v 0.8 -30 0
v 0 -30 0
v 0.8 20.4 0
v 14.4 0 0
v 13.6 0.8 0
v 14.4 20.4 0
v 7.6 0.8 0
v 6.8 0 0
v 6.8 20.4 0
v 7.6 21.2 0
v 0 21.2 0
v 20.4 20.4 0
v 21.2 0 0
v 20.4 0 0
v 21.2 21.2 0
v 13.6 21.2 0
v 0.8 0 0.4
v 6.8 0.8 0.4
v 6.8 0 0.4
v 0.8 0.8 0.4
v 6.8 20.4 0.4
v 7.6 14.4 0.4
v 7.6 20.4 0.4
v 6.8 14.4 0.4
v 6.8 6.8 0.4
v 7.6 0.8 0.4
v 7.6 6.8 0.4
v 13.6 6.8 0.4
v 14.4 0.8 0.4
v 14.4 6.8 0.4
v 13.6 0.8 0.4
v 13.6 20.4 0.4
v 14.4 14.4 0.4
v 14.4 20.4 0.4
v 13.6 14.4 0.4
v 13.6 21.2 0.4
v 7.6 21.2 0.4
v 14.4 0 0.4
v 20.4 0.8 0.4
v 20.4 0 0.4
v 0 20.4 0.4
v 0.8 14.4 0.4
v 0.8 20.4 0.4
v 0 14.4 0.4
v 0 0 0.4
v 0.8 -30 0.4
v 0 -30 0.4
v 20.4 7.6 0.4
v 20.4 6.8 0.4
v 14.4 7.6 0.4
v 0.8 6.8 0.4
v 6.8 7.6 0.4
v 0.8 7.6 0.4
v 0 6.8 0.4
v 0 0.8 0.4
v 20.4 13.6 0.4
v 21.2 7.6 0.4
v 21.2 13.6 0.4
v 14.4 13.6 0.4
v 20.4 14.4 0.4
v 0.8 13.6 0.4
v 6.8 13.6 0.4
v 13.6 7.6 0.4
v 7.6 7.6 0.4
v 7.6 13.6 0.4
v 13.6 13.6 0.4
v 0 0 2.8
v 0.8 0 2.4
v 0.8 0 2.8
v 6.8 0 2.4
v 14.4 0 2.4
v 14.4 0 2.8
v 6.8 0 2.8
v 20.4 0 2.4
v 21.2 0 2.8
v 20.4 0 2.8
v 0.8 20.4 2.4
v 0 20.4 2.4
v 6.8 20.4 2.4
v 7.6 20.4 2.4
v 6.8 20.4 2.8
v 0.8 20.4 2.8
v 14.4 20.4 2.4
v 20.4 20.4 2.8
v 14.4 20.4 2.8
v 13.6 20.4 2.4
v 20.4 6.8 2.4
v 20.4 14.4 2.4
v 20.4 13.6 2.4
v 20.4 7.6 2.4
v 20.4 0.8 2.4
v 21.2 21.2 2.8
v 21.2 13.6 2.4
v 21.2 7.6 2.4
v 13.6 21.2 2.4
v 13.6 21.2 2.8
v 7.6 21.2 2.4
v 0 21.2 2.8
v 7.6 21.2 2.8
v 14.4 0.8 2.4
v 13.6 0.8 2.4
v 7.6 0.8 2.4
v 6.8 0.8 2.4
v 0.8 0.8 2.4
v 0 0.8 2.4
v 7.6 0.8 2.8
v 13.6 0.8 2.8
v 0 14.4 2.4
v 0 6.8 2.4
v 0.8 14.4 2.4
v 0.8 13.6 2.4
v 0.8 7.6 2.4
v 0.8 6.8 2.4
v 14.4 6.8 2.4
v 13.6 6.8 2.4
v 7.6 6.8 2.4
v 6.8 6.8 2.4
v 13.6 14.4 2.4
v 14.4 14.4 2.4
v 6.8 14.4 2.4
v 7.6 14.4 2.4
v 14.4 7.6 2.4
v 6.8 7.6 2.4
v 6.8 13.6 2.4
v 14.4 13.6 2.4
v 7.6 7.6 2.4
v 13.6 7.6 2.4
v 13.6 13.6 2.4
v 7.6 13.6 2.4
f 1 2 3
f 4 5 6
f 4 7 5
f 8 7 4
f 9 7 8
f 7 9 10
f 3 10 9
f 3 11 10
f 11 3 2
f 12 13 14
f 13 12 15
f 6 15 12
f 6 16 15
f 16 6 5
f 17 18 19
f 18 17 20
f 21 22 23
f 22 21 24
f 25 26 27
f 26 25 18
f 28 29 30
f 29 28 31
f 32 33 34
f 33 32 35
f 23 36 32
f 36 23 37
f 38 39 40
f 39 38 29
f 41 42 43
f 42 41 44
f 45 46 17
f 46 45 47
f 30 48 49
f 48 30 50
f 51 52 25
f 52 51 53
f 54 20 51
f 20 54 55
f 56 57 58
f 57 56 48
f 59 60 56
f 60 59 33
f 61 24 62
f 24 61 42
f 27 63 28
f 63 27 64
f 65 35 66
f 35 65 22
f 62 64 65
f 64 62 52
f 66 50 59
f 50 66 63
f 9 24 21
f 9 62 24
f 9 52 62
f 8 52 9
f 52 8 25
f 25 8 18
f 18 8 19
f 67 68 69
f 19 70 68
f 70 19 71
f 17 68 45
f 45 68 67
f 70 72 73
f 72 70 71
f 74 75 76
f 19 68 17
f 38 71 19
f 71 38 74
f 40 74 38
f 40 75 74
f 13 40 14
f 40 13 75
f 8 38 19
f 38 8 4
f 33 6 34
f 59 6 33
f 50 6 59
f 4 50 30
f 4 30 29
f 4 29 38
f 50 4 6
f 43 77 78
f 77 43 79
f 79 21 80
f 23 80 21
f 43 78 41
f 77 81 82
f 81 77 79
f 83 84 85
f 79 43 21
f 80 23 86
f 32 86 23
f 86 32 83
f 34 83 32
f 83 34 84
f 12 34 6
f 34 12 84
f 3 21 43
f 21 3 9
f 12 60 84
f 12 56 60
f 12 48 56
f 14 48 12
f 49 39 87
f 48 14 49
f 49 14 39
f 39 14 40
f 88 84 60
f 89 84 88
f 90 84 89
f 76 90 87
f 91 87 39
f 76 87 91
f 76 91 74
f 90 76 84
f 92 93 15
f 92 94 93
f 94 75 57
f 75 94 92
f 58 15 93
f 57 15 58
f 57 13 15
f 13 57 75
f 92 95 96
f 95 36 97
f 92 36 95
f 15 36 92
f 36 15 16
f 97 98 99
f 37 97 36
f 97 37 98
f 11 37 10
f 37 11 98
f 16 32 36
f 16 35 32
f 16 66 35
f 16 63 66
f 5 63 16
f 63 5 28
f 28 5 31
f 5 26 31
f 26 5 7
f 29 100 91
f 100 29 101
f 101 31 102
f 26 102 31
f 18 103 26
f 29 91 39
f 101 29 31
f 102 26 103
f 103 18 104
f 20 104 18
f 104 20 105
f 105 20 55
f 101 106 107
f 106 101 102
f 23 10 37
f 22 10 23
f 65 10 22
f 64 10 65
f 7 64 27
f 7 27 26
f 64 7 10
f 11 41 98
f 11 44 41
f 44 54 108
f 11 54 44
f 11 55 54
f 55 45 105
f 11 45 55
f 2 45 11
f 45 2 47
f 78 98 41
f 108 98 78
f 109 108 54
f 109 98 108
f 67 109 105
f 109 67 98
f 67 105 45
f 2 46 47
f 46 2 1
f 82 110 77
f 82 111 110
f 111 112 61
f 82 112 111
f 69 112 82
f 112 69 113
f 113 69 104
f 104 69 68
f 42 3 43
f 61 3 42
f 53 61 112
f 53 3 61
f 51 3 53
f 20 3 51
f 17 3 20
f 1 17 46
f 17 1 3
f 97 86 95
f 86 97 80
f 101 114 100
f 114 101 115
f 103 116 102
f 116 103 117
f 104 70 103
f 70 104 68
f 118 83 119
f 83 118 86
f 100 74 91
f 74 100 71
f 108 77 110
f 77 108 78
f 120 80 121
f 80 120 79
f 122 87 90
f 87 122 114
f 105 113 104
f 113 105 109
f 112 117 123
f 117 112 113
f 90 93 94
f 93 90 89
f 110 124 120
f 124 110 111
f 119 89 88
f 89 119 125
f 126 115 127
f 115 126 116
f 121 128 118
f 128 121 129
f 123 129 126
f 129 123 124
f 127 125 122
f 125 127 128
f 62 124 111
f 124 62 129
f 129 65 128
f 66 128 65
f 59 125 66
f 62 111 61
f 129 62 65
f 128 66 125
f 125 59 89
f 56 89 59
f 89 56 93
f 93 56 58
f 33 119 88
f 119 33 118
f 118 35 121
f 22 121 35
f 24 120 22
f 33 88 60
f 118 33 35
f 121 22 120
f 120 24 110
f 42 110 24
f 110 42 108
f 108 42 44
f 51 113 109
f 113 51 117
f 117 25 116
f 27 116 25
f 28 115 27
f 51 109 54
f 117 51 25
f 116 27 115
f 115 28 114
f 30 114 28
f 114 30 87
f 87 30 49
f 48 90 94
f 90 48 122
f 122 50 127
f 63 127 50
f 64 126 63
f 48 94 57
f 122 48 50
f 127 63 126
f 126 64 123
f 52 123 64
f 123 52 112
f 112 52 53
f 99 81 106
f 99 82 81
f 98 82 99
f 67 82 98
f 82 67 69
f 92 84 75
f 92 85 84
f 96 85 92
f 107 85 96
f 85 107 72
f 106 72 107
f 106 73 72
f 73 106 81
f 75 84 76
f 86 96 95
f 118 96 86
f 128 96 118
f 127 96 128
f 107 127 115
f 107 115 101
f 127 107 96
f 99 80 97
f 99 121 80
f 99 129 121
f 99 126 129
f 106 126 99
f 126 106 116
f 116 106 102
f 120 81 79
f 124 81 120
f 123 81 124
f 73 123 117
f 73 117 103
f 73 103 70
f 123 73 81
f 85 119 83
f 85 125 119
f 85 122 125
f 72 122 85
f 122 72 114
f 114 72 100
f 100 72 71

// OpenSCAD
// file: ../../api/v3/reporting.scad
//////////////////////////////////////////////////////////////////////
// LibFile: reporting.scad
// Project: Grid Stack
// FileGroup: API v3 Reporting
// FileSummary: Console report for immutable direct and positive-gap coupons.
// Role: Records the exact environment, dimensions, support strategy, path
//       lengths, qualification status, and deposited-layer counts.
// Requires: API v3 indexes, mathematics, and path generator.
// Exports: report_structural_coupon_object().
//////////////////////////////////////////////////////////////////////

function _bridge_status3(span, process) =
    span <= process[PX3_BRIDGE_MAX]
        ? "within_owner_tested_limit"
        : "exploratory_beyond_owner_tested_limit";

module report_structural_coupon_object(object, report_level = "full") {
    material = object[SCO_MATERIAL];
    nozzle = object[SCO_NOZZLE];
    printer = object[SCO_PRINTER];
    process = object[SCO_PROCESS];
    boundary = object[SCO_BOUNDARY];
    gap = object[SCO_CLEAR_GAP];
    strategy = object[SCO_SUPPORT_STRATEGY];

    echo("--- Grid Stack immutable structural coupon ---");
    echo(str("Object: ", object[SCO_NAME], " revision ", object[SCO_REVISION]));
    echo(str("API/schema: ", object[SCO_REQUIRED_API], "/",
        object[SCO_SCHEMA_VERSION]));
    echo(str("Release/base commit: ", object[SCO_SOURCE_RELEASE], " / ",
        object[SCO_FRAMEWORK_BASE_COMMIT]));
    echo(str("Material/nozzle/printer: ", material[MAT3_FAMILY], " / ",
        nozzle[NZ3_DIAMETER], " mm / ", printer[PRN3_NAME]));
    echo(str("Cells: ", boundary[B3_CELLS_X], " x ", boundary[B3_CELLS_Y]));
    echo(str("Clear spans: ", boundary[B3_CLEAR_SPAN_X], " x ",
        boundary[B3_CLEAR_SPAN_Y], " mm"));
    echo(str("Span status: ",
        _bridge_status3(boundary[B3_CLEAR_SPAN_X], process)));
    echo(str("Outside size: ", boundary_size_x3(boundary, process, nozzle),
        " x ", boundary_size_y3(boundary, process, nozzle), " mm"));
    echo(str("Primitive trace: ", trace_width3(nozzle), " x ",
        trace_height3(process), " mm"));
    echo(str("Structural strand: ", strand_width3(process, nozzle), " x ",
        strand_height3(process), " mm"));
    echo(str("Clear vertical gap: ", gap, " mm"));
    echo(str("Support strategy: ", strategy));
    echo(str("Total modeled height: ", coupon_total_height3(object), " mm"));

    if (report_level == "full") {
        if (strategy == "direct_orthogonal") {
            lower = coupon_path(
                boundary, process, nozzle, 0, object[SCO_LEAD_IN]
            );
            upper = coupon_path(boundary, process, nozzle, 90, 0);
            echo(str("Lower/upper path lengths: ", path_length3(lower),
                " / ", path_length3(upper), " mm"));
            echo(str("Deposited layers: ", 2 * process[PX3_HEIGHT_PASSES]));
        }
        else {
            witness = coupon_path(
                boundary, process, nozzle, 90, object[SCO_LEAD_IN]
            );
            riser = coupon_path(boundary, process, nozzle, 0, 0);
            test = coupon_path(boundary, process, nozzle, 90, 0);
            echo(str("Witness/riser/test path lengths: ",
                path_length3(witness), " / ", path_length3(riser), " / ",
                path_length3(test), " mm"));
            echo(str("Riser deposited layers: ", round(gap_layer_count3(object))));
            echo(str("Total deposited layers: ",
                2 * process[PX3_HEIGHT_PASSES] +
                round(gap_layer_count3(object))));
        }
        echo(str("Status: ", object[SCO_STATUS]));
        echo(str("Notes: ", object[SCO_NOTES]));
    }
}
// file: ../../api/v3/validation.scad
//////////////////////////////////////////////////////////////////////
// LibFile: validation.scad
// Project: Grid Stack
// FileGroup: API v3 Validation
// FileSummary: Validates immutable environment records, count boundaries,
//              support strategy, path continuity, and layer quantization.
// Role: Rejects incompatible or physically floating recipes before geometry
//       is generated.
// Requires: API v3 indexes, mathematics, and path generator.
// Exports: validate_structural_coupon_object().
//////////////////////////////////////////////////////////////////////

module _validate_path3(points, boundary, orientation, lead_in) {
    run_count = orientation == 0
        ? boundary_strand_count_y3(boundary)
        : boundary_strand_count_x3(boundary);

    assert(len(points) == expected_coupon_point_count3(run_count, lead_in),
        "API v3 coupon path has an unexpected point count.");
    assert(!path_has_zero_segment3(points),
        "API v3 coupon path contains a zero-length segment.");
    assert(path_axis_aligned3(points),
        "API v3 coupon path must remain axis-aligned.");
    assert(points[0] != points[len(points) - 1],
        "API v3 coupon path must remain open.");
}

module validate_structural_coupon_object(object) {
    assert(object[SCO_REQUIRED_API] == GRID_STACK_API_VERSION,
        "Saved coupon requires a different Grid Stack API version.");
    assert(object[SCO_SCHEMA_VERSION] == GRID_STACK_COUPON_SCHEMA_VERSION,
        "Saved coupon requires a different coupon schema version.");
    assert(GRID_STACK_RECTANGULAR_FRAMEWORK_VERSION == 2,
        "Saved coupon requires rectangular framework version 2.");

    material = object[SCO_MATERIAL];
    nozzle = object[SCO_NOZZLE];
    printer = object[SCO_PRINTER];
    process = object[SCO_PROCESS];
    boundary = object[SCO_BOUNDARY];
    gap = object[SCO_CLEAR_GAP];
    lead_in = object[SCO_LEAD_IN];
    strategy = object[SCO_SUPPORT_STRATEGY];

    assert(nozzle[NZ3_DIAMETER] > 0,
        "Saved coupon nozzle diameter must be positive.");
    assert(process[PX3_LAYER_H] > 0,
        "Saved coupon layer height must be positive.");
    assert(process[PX3_WIDTH_PASSES] >= 2,
        "Saved coupon structural width requires at least two passes.");
    assert(process[PX3_HEIGHT_PASSES] >= 2,
        "Saved coupon structural height requires at least two layers.");
    assert(process[PX3_MATERIAL] == material[MAT3_NAME],
        "Saved coupon process/material references do not match.");
    assert(process[PX3_NOZZLE] == nozzle[NZ3_NAME],
        "Saved coupon process/nozzle references do not match.");
    assert(process[PX3_PRINTER] == printer[PRN3_NAME],
        "Saved coupon process/printer references do not match.");
    assert(boundary[B3_CELLS_X] > 0 && boundary[B3_CELLS_Y] > 0,
        "Saved coupon cell counts must be positive.");
    assert(boundary[B3_CLEAR_SPAN_X] > 0 &&
           boundary[B3_CLEAR_SPAN_Y] > 0,
        "Saved coupon clear spans must be positive.");
    assert(lead_in >= 0,
        "Saved coupon lead-in cannot be negative.");
    assert(gap >= 0,
        "Saved coupon clear gap cannot be negative.");
    assert(nearly_equal3(gap_layer_count3(object), round(gap_layer_count3(object))),
        "Saved coupon clear gap must equal a whole deposited-layer count.");
    assert(
        (strategy == "direct_orthogonal" && nearly_equal3(gap, 0)) ||
        (strategy == "witness_riser_bridge" && gap > 0),
        "Saved coupon support strategy does not match its clear gap."
    );

    if (strategy == "direct_orthogonal") {
        lower = coupon_path(boundary, process, nozzle, 0, lead_in);
        upper = coupon_path(boundary, process, nozzle, 90, 0);
        _validate_path3(lower, boundary, 0, lead_in);
        _validate_path3(upper, boundary, 90, 0);
        entry = lead_in > 0 ? 1 : 0;
        assert(nearly_equal3(point_distance_2d3(lower[entry], upper[0]), 0),
            "Direct upper path must start on the lower entry crossing.");
    }
    else {
        witness = coupon_path(boundary, process, nozzle, 90, lead_in);
        riser = coupon_path(boundary, process, nozzle, 0, 0);
        test = coupon_path(boundary, process, nozzle, 90, 0);
        _validate_path3(witness, boundary, 90, lead_in);
        _validate_path3(riser, boundary, 0, 0);
        _validate_path3(test, boundary, 90, 0);
        entry = lead_in > 0 ? 1 : 0;
        assert(nearly_equal3(point_distance_2d3(witness[entry], riser[0]), 0),
            "Riser path must start on the witness entry crossing.");
        assert(nearly_equal3(point_distance_2d3(riser[0], test[0]), 0),
            "Upper test path must start on the riser entry crossing.");
        for (i = [0 : len(test) - 1])
            assert(nearly_equal3(point_distance_2d3(test[i], witness[i + entry]), 0),
                "Upper test path must align directly above the witness path.");
    }

    echo("GRID STACK API V3 COUPON VALIDATION: PASS");
}
// file: ../../api/v3/geometry.scad
//////////////////////////////////////////////////////////////////////
// LibFile: geometry.scad
// Project: Grid Stack
// FileGroup: API v3 Printable Geometry
// FileSummary: Creates square-ended structural paths, direct-contact coupons,
//              positive witness/riser/bridge coupons, and simple diagnostics.
// Role: Supplies all geometry used by immutable API v3 recipes without
//       importing mutable workbench geometry.
// Requires: API v3 mathematics and ordered axis-aligned paths.
// Exports: render_direct_coupon(), render_positive_gap_coupon(), and
//          render_coupon_path_debug().
//////////////////////////////////////////////////////////////////////

module _segment_2d3(a, b, width) {
    horizontal = nearly_equal3(a[1], b[1]);
    vertical = nearly_equal3(a[0], b[0]);

    assert(horizontal || vertical,
        "API v3 printable segments must be horizontal or vertical.");
    assert(!nearly_equal3(point_distance_2d3(a, b), 0),
        "API v3 printable segments must have nonzero length.");

    if (horizontal)
        translate([min(a[0], b[0]) - width / 2, a[1] - width / 2])
            square([abs(b[0] - a[0]) + width, width]);
    else
        translate([a[0] - width / 2, min(a[1], b[1]) - width / 2])
            square([width, abs(b[1] - a[1]) + width]);
}

module _path_2d3(points, width) {
    union()
        for (i = [0 : len(points) - 2])
            _segment_2d3(points[i], points[i + 1], width);
}

module _structural_path3(points, process, nozzle) {
    linear_extrude(height = strand_height3(process), convexity = 10)
        _path_2d3(points, strand_width3(process, nozzle));
}

module render_direct_coupon(lower, upper, process, nozzle) {
    union() {
        _structural_path3(lower, process, nozzle);
        translate([0, 0, strand_height3(process)])
            _structural_path3(upper, process, nozzle);
    }
}

module render_positive_gap_coupon(
    witness, riser, test, process, nozzle, clear_gap
) {
    union() {
        _structural_path3(witness, process, nozzle);

        translate([0, 0, strand_height3(process)])
            linear_extrude(height = clear_gap, convexity = 10)
                _path_2d3(riser, strand_width3(process, nozzle));

        translate([0, 0, strand_height3(process) + clear_gap])
            _structural_path3(test, process, nozzle);
    }
}

module _debug_path3(points, z, width) {
    translate([0, 0, z])
        linear_extrude(height = 0.04)
            _path_2d3(points, width);
}

module render_coupon_path_debug(
    lower, upper, riser, process, clear_gap = 0
) {
    width = max(0.12, trace_height3(process));
    _debug_path3(lower, 0, width);
    if (len(riser) > 0)
        _debug_path3(riser, strand_height3(process), width);
    _debug_path3(
        upper,
        strand_height3(process) + clear_gap,
        width
    );
}
// file: ../../api/v3/paths.scad
//////////////////////////////////////////////////////////////////////
// LibFile: paths.scad
// Project: Grid Stack
// FileGroup: API v3 Path Generation
// FileSummary: Generates one open rectangular serpentine centerline from a
//              count boundary for X- or Y-running structural paths.
// Role: Preserves parallel runs, square connectors, optional single lead-in,
//       and one uninterrupted ordered point list per deposited layer.
// Requires: API v3 indexes and mathematics.
// Exports: coupon_path() and expected_coupon_point_count3().
//////////////////////////////////////////////////////////////////////

function _x_rows3(row, count, x_min, x_max, y_min, pitch) =
    row >= count
        ? []
        : let(
            y = y_min + row * pitch,
            x_end = row % 2 == 0 ? x_max : x_min,
            row_end = [x_end, y],
            connector_end = [x_end, y + pitch]
        )
        concat(
            [row_end],
            row < count - 1 ? [connector_end] : [],
            _x_rows3(row + 1, count, x_min, x_max, y_min, pitch)
        );

function _y_columns3(column, count, x_min, y_min, y_max, pitch) =
    column >= count
        ? []
        : let(
            x = x_min + column * pitch,
            y_end = column % 2 == 0 ? y_max : y_min,
            column_end = [x, y_end],
            connector_end = [x + pitch, y_end]
        )
        concat(
            [column_end],
            column < count - 1 ? [connector_end] : [],
            _y_columns3(column + 1, count, x_min, y_min, y_max, pitch)
        );

function expected_coupon_point_count3(run_count, lead_in = 0) =
    2 * run_count + (lead_in > 0 ? 1 : 0);

function coupon_path(
    boundary, process, nozzle, orientation = 0, lead_in = 0
) =
    assert(orientation == 0 || orientation == 90,
        "API v3 coupon orientation must be 0 or 90 degrees.")
    assert(lead_in >= 0,
        "API v3 coupon lead-in cannot be negative.")
    let(
        width = strand_width3(process, nozzle),
        x_min = width / 2,
        y_min = width / 2,
        x_max = boundary_size_x3(boundary, process, nozzle) - width / 2,
        y_max = boundary_size_y3(boundary, process, nozzle) - width / 2,
        entry = [x_min, y_min],
        prefix = lead_in > 0
            ? (orientation == 0
                ? [[x_min - lead_in, y_min], entry]
                : [[x_min, y_min - lead_in], entry])
            : [entry]
    )
    orientation == 0
        ? concat(
            prefix,
            _x_rows3(
                0, boundary_strand_count_y3(boundary),
                x_min, x_max, y_min,
                boundary_pitch_y3(boundary, process, nozzle)
            )
        )
        : concat(
            prefix,
            _y_columns3(
                0, boundary_strand_count_x3(boundary),
                x_min, y_min, y_max,
                boundary_pitch_x3(boundary, process, nozzle)
            )
        );
// file: ../../api/v3/math.scad
//////////////////////////////////////////////////////////////////////
// LibFile: math.scad
// Project: Grid Stack
// FileGroup: API v3 Mathematics
// FileSummary: Pure trace, strand, boundary, path, and layer-count helpers.
// Role: Keeps API v3 calculations isolated and reproducible without importing
//       mutable workbench mathematics.
// Requires: API v3 indexes.
// Exports: nearly_equal3(), trace/strand dimensions, boundary dimensions,
//          path inspection, gap-layer count, and total-height helpers.
//////////////////////////////////////////////////////////////////////

function nearly_equal3(a, b, epsilon = 0.000001) = abs(a - b) <= epsilon;

function trace_width3(nozzle) = nozzle[NZ3_DIAMETER];
function trace_height3(process) = process[PX3_LAYER_H];
function strand_width3(process, nozzle) =
    trace_width3(nozzle) * process[PX3_WIDTH_PASSES];
function strand_height3(process) =
    trace_height3(process) * process[PX3_HEIGHT_PASSES];

function boundary_strand_count_x3(boundary) = boundary[B3_CELLS_X] + 1;
function boundary_strand_count_y3(boundary) = boundary[B3_CELLS_Y] + 1;
function boundary_pitch_x3(boundary, process, nozzle) =
    boundary[B3_CLEAR_SPAN_X] + strand_width3(process, nozzle);
function boundary_pitch_y3(boundary, process, nozzle) =
    boundary[B3_CLEAR_SPAN_Y] + strand_width3(process, nozzle);
function boundary_size_x3(boundary, process, nozzle) =
    boundary[B3_CELLS_X] * boundary[B3_CLEAR_SPAN_X] +
    boundary_strand_count_x3(boundary) * strand_width3(process, nozzle);
function boundary_size_y3(boundary, process, nozzle) =
    boundary[B3_CELLS_Y] * boundary[B3_CLEAR_SPAN_Y] +
    boundary_strand_count_y3(boundary) * strand_width3(process, nozzle);

function point_distance_2d3(a, b) =
    sqrt(pow(b[0] - a[0], 2) + pow(b[1] - a[1], 2));
function path_length3(points, i = 0) =
    i >= len(points) - 1
        ? 0
        : point_distance_2d3(points[i], points[i + 1]) +
          path_length3(points, i + 1);
function path_has_zero_segment3(points, i = 0) =
    i >= len(points) - 1
        ? false
        : nearly_equal3(point_distance_2d3(points[i], points[i + 1]), 0)
            ? true
            : path_has_zero_segment3(points, i + 1);
function segment_axis_aligned3(a, b) =
    nearly_equal3(a[0], b[0]) || nearly_equal3(a[1], b[1]);
function path_axis_aligned3(points, i = 0) =
    i >= len(points) - 1
        ? true
        : segment_axis_aligned3(points[i], points[i + 1]) &&
          path_axis_aligned3(points, i + 1);

function gap_layer_count3(object) =
    object[SCO_CLEAR_GAP] / trace_height3(object[SCO_PROCESS]);
function coupon_total_height3(object) =
    2 * strand_height3(object[SCO_PROCESS]) + object[SCO_CLEAR_GAP];
// file: ../../api/v3/schema.scad
//////////////////////////////////////////////////////////////////////
// LibFile: schema.scad
// Project: Grid Stack
// FileGroup: API v3 Data Model
// FileSummary: Constructors for self-contained immutable structural coupons.
// Role: Makes every geometry-affecting environment and object value explicit
//       inside the saved recipe rather than resolving mutable catalog names.
// Exports: material_spec(), nozzle_spec(), printer_spec(),
//          structural_process_profile(), count_boundary(), and
//          structural_coupon_object().
//////////////////////////////////////////////////////////////////////

function material_spec(
    name, family, flexibility, status = "in_use", notes = ""
) = [name, family, flexibility, status, notes];

function nozzle_spec(
    name, diameter, construction = "brass", status = "in_use", notes = ""
) = [name, diameter, construction, status, notes];

function printer_spec(
    name,
    manufacturer = "",
    model = "",
    motion_system = "",
    build_surface = "",
    status = "unrecorded",
    notes = ""
) = [
    name, manufacturer, model, motion_system,
    build_surface, status, notes
];

function structural_process_profile(
    name,
    material_name,
    nozzle_name,
    printer_name,
    layer_height,
    width_passes,
    height_passes,
    bridge_max,
    qualification,
    revision,
    notes = ""
) = [
    name, material_name, nozzle_name, printer_name,
    layer_height, width_passes, height_passes, bridge_max,
    qualification, revision, notes
];

// Function: count_boundary()
// Synopsis: Stores clear-opening counts and clear spans for one rectangle.
function count_boundary(
    name,
    cells_x,
    cells_y,
    clear_span_x,
    clear_span_y,
    notes = ""
) = [name, cells_x, cells_y, clear_span_x, clear_span_y, notes];

// Function: structural_coupon_object()
// Synopsis: Constructs one permanent coupon recipe.
// Description:
//   framework_base_commit records the last accepted repository state used to
//   begin the API implementation. The Git commit containing this recipe is the
//   authoritative complete source; a file cannot embed its own future hash.
function structural_coupon_object(
    name,
    revision,
    required_api_version,
    coupon_schema_version,
    source_release,
    framework_base_commit,
    material,
    nozzle,
    printer,
    process,
    boundary,
    clear_vertical_gap,
    lead_in,
    support_strategy,
    status = "calibration",
    notes = ""
) = [
    name,
    revision,
    required_api_version,
    coupon_schema_version,
    source_release,
    framework_base_commit,
    material,
    nozzle,
    printer,
    process,
    boundary,
    clear_vertical_gap,
    lead_in,
    support_strategy,
    status,
    notes
];
// file: ../../api/v3/indices.scad
//////////////////////////////////////////////////////////////////////
// LibFile: indices.scad
// Project: Grid Stack
// FileGroup: API v3 Data Model
// FileSummary: Named indexes for immutable structural-coupon records.
// Role: Prevents unexplained numeric indexes from entering saved recipes and
//       keeps API version 3 independent of mutable workbench indexes.
// Exports: MAT3_*, NZ3_*, PRN3_*, PX3_*, B3_*, and SCO_* constants.
//////////////////////////////////////////////////////////////////////

MAT3_NAME = 0;
MAT3_FAMILY = 1;
MAT3_FLEXIBILITY = 2;
MAT3_STATUS = 3;
MAT3_NOTES = 4;

NZ3_NAME = 0;
NZ3_DIAMETER = 1;
NZ3_CONSTRUCTION = 2;
NZ3_STATUS = 3;
NZ3_NOTES = 4;

PRN3_NAME = 0;
PRN3_MANUFACTURER = 1;
PRN3_MODEL = 2;
PRN3_MOTION_SYSTEM = 3;
PRN3_BUILD_SURFACE = 4;
PRN3_STATUS = 5;
PRN3_NOTES = 6;

PX3_NAME = 0;
PX3_MATERIAL = 1;
PX3_NOZZLE = 2;
PX3_PRINTER = 3;
PX3_LAYER_H = 4;
PX3_WIDTH_PASSES = 5;
PX3_HEIGHT_PASSES = 6;
PX3_BRIDGE_MAX = 7;
PX3_QUALIFICATION = 8;
PX3_REVISION = 9;
PX3_NOTES = 10;

B3_NAME = 0;
B3_CELLS_X = 1;
B3_CELLS_Y = 2;
B3_CLEAR_SPAN_X = 3;
B3_CLEAR_SPAN_Y = 4;
B3_NOTES = 5;

SCO_NAME = 0;
SCO_REVISION = 1;
SCO_REQUIRED_API = 2;
SCO_SCHEMA_VERSION = 3;
SCO_SOURCE_RELEASE = 4;
SCO_FRAMEWORK_BASE_COMMIT = 5;
SCO_MATERIAL = 6;
SCO_NOZZLE = 7;
SCO_PRINTER = 8;
SCO_PROCESS = 9;
SCO_BOUNDARY = 10;
SCO_CLEAR_GAP = 11;
SCO_LEAD_IN = 12;
SCO_SUPPORT_STRATEGY = 13;
SCO_STATUS = 14;
SCO_NOTES = 15;
// file: ../../api/grid_stack_v3.scad
//////////////////////////////////////////////////////////////////////
// LibFile: grid_stack_v3.scad
// Project: Grid Stack
// FileGroup: Versioned Public Interface
// FileSummary: Immutable API version 3 for rectangular count-boundary
//              structural coupons, including positive witness/riser gaps.
// Role: Reconstructs saved coupon recipes without Customizer state or mutable
//       workbench catalogs. Incompatible behavior requires a new API file.
// Exports: API/schema constants, record constructors, validation, reporting,
//          and structural_coupon_render().
//////////////////////////////////////////////////////////////////////

GRID_STACK_API_VERSION = 3;
GRID_STACK_COUPON_SCHEMA_VERSION = 1;
GRID_STACK_RECTANGULAR_FRAMEWORK_VERSION = 2;
GRID_STACK_RELEASE = "1.0.0";

include <v3/indices.scad>
include <v3/schema.scad>
include <v3/math.scad>
include <v3/paths.scad>
include <v3/geometry.scad>
include <v3/validation.scad>
include <v3/reporting.scad>

// Module: structural_coupon_render()
// Synopsis: Validates, reports, and renders one immutable coupon recipe.
// Arguments:
//   object = Record returned by structural_coupon_object().
//   mode = print, path_debug, or report_only.
//   report_level = summary or full.
module structural_coupon_render(
    object,
    mode = "print",
    report_level = "full"
) {
    validate_structural_coupon_object(object);
    report_structural_coupon_object(object, report_level);

    boundary = object[SCO_BOUNDARY];
    process = object[SCO_PROCESS];
    nozzle = object[SCO_NOZZLE];
    lead_in = object[SCO_LEAD_IN];
    clear_gap = object[SCO_CLEAR_GAP];
    strategy = object[SCO_SUPPORT_STRATEGY];

    if (strategy == "direct_orthogonal") {
        lower = coupon_path(boundary, process, nozzle, 0, lead_in);
        upper = coupon_path(boundary, process, nozzle, 90, 0);

        if (mode == "print")
            render_direct_coupon(lower, upper, process, nozzle);
        else if (mode == "path_debug")
            render_coupon_path_debug(lower, upper, [], process);
        else if (mode == "report_only")
            echo("Grid Stack API v3 report-only mode: no geometry generated.");
        else
            assert(false, str("Unknown API v3 render mode: ", mode));
    }
    else if (strategy == "witness_riser_bridge") {
        witness = coupon_path(boundary, process, nozzle, 90, lead_in);
        riser = coupon_path(boundary, process, nozzle, 0, 0);
        test = coupon_path(boundary, process, nozzle, 90, 0);

        if (mode == "print")
            render_positive_gap_coupon(
                witness, riser, test, process, nozzle, clear_gap
            );
        else if (mode == "path_debug")
            render_coupon_path_debug(witness, test, riser, process, clear_gap);
        else if (mode == "report_only")
            echo("Grid Stack API v3 report-only mode: no geometry generated.");
        else
            assert(false, str("Unknown API v3 render mode: ", mode));
    }
    else
        assert(false, str("Unknown coupon support strategy: ", strategy));
}
// main file
//////////////////////////////////////////////////////////////////////
// LibFile: coupon-3x3-span6-gap2-pla-plus-0p4-v1.scad
// Project: Grid Stack
// FileGroup: Immutable Structural Coupon
// FileSummary: 3 x 3 PLA+ coupon with 6 mm clear XY spans and 2 mm
//              clear vertical gap using witness_riser_bridge geometry.
// Role: Permanently reconstructs one calibration object without Customizer
//       state or mutable workbench catalog lookup.
// FrameworkBaseCommit: 4b5e564
// Requires: Grid Stack API version 3 and coupon schema version 1.
// Output: Printable continuous-path structural coupon geometry.
//////////////////////////////////////////////////////////////////////

include <../../api/grid_stack_v3.scad>

assert(GRID_STACK_API_VERSION == 3,
    "This recipe requires Grid Stack API version 3.");
assert(GRID_STACK_COUPON_SCHEMA_VERSION == 1,
    "This recipe requires coupon schema version 1.");
assert(GRID_STACK_RECTANGULAR_FRAMEWORK_VERSION == 2,
    "This recipe requires rectangular framework version 2.");

saved_material = material_spec(
    name = "PLA_PLUS",
    family = "PLA+",
    flexibility = "rigid",
    status = "in_use",
    notes = "Exact material family selected for the coupon matrix."
);

saved_nozzle = nozzle_spec(
    name = "BRASS_0P4",
    diameter = 0.4,
    construction = "brass",
    status = "in_use",
    notes = "Nominal nozzle diameter used to derive the 0.8 mm strand width."
);

saved_printer = printer_spec(
    name = "UNRECORDED_PRINTER_R1",
    manufacturer = "",
    model = "",
    motion_system = "",
    build_surface = "",
    status = "unrecorded",
    notes = "Printer identity was not frozen with this coupon framework."
);

saved_process = structural_process_profile(
    name = "PLA_PLUS_0P4_LH0P2_W2_H2_R1",
    material_name = "PLA_PLUS",
    nozzle_name = "BRASS_0P4",
    printer_name = "UNRECORDED_PRINTER_R1",
    layer_height = 0.2,
    width_passes = 2,
    height_passes = 2,
    bridge_max = 6,
    qualification = "owner_tested_to_6mm",
    revision = 1,
    notes = "Primitive trace 0.4 x 0.2 mm; structural strand 0.8 x 0.4 mm."
);

saved_boundary = count_boundary(
    name = "COUNT_3X3_SPAN6",
    cells_x = 3,
    cells_y = 3,
    clear_span_x = 6,
    clear_span_y = 6,
    notes = "Outside dimensions derive from four strands and three clear openings."
);

saved_coupon = structural_coupon_object(
    name = "COUPON_3X3_SPAN6_GAP2_PLA_PLUS_0P4_V1",
    revision = 1,
    required_api_version = 3,
    coupon_schema_version = 1,
    source_release = "1.0.0",
    framework_base_commit = "4b5e564",
    material = saved_material,
    nozzle = saved_nozzle,
    printer = saved_printer,
    process = saved_process,
    boundary = saved_boundary,
    clear_vertical_gap = 2,
    lead_in = 30,
    support_strategy = "witness_riser_bridge",
    status = "calibration_unprinted",
    notes = "Calibration recipe generated from the frozen Batch 010 framework; record results in a new revision after printing."
);

structural_coupon_render(
    saved_coupon,
    mode = "print",
    report_level = "full"
);
